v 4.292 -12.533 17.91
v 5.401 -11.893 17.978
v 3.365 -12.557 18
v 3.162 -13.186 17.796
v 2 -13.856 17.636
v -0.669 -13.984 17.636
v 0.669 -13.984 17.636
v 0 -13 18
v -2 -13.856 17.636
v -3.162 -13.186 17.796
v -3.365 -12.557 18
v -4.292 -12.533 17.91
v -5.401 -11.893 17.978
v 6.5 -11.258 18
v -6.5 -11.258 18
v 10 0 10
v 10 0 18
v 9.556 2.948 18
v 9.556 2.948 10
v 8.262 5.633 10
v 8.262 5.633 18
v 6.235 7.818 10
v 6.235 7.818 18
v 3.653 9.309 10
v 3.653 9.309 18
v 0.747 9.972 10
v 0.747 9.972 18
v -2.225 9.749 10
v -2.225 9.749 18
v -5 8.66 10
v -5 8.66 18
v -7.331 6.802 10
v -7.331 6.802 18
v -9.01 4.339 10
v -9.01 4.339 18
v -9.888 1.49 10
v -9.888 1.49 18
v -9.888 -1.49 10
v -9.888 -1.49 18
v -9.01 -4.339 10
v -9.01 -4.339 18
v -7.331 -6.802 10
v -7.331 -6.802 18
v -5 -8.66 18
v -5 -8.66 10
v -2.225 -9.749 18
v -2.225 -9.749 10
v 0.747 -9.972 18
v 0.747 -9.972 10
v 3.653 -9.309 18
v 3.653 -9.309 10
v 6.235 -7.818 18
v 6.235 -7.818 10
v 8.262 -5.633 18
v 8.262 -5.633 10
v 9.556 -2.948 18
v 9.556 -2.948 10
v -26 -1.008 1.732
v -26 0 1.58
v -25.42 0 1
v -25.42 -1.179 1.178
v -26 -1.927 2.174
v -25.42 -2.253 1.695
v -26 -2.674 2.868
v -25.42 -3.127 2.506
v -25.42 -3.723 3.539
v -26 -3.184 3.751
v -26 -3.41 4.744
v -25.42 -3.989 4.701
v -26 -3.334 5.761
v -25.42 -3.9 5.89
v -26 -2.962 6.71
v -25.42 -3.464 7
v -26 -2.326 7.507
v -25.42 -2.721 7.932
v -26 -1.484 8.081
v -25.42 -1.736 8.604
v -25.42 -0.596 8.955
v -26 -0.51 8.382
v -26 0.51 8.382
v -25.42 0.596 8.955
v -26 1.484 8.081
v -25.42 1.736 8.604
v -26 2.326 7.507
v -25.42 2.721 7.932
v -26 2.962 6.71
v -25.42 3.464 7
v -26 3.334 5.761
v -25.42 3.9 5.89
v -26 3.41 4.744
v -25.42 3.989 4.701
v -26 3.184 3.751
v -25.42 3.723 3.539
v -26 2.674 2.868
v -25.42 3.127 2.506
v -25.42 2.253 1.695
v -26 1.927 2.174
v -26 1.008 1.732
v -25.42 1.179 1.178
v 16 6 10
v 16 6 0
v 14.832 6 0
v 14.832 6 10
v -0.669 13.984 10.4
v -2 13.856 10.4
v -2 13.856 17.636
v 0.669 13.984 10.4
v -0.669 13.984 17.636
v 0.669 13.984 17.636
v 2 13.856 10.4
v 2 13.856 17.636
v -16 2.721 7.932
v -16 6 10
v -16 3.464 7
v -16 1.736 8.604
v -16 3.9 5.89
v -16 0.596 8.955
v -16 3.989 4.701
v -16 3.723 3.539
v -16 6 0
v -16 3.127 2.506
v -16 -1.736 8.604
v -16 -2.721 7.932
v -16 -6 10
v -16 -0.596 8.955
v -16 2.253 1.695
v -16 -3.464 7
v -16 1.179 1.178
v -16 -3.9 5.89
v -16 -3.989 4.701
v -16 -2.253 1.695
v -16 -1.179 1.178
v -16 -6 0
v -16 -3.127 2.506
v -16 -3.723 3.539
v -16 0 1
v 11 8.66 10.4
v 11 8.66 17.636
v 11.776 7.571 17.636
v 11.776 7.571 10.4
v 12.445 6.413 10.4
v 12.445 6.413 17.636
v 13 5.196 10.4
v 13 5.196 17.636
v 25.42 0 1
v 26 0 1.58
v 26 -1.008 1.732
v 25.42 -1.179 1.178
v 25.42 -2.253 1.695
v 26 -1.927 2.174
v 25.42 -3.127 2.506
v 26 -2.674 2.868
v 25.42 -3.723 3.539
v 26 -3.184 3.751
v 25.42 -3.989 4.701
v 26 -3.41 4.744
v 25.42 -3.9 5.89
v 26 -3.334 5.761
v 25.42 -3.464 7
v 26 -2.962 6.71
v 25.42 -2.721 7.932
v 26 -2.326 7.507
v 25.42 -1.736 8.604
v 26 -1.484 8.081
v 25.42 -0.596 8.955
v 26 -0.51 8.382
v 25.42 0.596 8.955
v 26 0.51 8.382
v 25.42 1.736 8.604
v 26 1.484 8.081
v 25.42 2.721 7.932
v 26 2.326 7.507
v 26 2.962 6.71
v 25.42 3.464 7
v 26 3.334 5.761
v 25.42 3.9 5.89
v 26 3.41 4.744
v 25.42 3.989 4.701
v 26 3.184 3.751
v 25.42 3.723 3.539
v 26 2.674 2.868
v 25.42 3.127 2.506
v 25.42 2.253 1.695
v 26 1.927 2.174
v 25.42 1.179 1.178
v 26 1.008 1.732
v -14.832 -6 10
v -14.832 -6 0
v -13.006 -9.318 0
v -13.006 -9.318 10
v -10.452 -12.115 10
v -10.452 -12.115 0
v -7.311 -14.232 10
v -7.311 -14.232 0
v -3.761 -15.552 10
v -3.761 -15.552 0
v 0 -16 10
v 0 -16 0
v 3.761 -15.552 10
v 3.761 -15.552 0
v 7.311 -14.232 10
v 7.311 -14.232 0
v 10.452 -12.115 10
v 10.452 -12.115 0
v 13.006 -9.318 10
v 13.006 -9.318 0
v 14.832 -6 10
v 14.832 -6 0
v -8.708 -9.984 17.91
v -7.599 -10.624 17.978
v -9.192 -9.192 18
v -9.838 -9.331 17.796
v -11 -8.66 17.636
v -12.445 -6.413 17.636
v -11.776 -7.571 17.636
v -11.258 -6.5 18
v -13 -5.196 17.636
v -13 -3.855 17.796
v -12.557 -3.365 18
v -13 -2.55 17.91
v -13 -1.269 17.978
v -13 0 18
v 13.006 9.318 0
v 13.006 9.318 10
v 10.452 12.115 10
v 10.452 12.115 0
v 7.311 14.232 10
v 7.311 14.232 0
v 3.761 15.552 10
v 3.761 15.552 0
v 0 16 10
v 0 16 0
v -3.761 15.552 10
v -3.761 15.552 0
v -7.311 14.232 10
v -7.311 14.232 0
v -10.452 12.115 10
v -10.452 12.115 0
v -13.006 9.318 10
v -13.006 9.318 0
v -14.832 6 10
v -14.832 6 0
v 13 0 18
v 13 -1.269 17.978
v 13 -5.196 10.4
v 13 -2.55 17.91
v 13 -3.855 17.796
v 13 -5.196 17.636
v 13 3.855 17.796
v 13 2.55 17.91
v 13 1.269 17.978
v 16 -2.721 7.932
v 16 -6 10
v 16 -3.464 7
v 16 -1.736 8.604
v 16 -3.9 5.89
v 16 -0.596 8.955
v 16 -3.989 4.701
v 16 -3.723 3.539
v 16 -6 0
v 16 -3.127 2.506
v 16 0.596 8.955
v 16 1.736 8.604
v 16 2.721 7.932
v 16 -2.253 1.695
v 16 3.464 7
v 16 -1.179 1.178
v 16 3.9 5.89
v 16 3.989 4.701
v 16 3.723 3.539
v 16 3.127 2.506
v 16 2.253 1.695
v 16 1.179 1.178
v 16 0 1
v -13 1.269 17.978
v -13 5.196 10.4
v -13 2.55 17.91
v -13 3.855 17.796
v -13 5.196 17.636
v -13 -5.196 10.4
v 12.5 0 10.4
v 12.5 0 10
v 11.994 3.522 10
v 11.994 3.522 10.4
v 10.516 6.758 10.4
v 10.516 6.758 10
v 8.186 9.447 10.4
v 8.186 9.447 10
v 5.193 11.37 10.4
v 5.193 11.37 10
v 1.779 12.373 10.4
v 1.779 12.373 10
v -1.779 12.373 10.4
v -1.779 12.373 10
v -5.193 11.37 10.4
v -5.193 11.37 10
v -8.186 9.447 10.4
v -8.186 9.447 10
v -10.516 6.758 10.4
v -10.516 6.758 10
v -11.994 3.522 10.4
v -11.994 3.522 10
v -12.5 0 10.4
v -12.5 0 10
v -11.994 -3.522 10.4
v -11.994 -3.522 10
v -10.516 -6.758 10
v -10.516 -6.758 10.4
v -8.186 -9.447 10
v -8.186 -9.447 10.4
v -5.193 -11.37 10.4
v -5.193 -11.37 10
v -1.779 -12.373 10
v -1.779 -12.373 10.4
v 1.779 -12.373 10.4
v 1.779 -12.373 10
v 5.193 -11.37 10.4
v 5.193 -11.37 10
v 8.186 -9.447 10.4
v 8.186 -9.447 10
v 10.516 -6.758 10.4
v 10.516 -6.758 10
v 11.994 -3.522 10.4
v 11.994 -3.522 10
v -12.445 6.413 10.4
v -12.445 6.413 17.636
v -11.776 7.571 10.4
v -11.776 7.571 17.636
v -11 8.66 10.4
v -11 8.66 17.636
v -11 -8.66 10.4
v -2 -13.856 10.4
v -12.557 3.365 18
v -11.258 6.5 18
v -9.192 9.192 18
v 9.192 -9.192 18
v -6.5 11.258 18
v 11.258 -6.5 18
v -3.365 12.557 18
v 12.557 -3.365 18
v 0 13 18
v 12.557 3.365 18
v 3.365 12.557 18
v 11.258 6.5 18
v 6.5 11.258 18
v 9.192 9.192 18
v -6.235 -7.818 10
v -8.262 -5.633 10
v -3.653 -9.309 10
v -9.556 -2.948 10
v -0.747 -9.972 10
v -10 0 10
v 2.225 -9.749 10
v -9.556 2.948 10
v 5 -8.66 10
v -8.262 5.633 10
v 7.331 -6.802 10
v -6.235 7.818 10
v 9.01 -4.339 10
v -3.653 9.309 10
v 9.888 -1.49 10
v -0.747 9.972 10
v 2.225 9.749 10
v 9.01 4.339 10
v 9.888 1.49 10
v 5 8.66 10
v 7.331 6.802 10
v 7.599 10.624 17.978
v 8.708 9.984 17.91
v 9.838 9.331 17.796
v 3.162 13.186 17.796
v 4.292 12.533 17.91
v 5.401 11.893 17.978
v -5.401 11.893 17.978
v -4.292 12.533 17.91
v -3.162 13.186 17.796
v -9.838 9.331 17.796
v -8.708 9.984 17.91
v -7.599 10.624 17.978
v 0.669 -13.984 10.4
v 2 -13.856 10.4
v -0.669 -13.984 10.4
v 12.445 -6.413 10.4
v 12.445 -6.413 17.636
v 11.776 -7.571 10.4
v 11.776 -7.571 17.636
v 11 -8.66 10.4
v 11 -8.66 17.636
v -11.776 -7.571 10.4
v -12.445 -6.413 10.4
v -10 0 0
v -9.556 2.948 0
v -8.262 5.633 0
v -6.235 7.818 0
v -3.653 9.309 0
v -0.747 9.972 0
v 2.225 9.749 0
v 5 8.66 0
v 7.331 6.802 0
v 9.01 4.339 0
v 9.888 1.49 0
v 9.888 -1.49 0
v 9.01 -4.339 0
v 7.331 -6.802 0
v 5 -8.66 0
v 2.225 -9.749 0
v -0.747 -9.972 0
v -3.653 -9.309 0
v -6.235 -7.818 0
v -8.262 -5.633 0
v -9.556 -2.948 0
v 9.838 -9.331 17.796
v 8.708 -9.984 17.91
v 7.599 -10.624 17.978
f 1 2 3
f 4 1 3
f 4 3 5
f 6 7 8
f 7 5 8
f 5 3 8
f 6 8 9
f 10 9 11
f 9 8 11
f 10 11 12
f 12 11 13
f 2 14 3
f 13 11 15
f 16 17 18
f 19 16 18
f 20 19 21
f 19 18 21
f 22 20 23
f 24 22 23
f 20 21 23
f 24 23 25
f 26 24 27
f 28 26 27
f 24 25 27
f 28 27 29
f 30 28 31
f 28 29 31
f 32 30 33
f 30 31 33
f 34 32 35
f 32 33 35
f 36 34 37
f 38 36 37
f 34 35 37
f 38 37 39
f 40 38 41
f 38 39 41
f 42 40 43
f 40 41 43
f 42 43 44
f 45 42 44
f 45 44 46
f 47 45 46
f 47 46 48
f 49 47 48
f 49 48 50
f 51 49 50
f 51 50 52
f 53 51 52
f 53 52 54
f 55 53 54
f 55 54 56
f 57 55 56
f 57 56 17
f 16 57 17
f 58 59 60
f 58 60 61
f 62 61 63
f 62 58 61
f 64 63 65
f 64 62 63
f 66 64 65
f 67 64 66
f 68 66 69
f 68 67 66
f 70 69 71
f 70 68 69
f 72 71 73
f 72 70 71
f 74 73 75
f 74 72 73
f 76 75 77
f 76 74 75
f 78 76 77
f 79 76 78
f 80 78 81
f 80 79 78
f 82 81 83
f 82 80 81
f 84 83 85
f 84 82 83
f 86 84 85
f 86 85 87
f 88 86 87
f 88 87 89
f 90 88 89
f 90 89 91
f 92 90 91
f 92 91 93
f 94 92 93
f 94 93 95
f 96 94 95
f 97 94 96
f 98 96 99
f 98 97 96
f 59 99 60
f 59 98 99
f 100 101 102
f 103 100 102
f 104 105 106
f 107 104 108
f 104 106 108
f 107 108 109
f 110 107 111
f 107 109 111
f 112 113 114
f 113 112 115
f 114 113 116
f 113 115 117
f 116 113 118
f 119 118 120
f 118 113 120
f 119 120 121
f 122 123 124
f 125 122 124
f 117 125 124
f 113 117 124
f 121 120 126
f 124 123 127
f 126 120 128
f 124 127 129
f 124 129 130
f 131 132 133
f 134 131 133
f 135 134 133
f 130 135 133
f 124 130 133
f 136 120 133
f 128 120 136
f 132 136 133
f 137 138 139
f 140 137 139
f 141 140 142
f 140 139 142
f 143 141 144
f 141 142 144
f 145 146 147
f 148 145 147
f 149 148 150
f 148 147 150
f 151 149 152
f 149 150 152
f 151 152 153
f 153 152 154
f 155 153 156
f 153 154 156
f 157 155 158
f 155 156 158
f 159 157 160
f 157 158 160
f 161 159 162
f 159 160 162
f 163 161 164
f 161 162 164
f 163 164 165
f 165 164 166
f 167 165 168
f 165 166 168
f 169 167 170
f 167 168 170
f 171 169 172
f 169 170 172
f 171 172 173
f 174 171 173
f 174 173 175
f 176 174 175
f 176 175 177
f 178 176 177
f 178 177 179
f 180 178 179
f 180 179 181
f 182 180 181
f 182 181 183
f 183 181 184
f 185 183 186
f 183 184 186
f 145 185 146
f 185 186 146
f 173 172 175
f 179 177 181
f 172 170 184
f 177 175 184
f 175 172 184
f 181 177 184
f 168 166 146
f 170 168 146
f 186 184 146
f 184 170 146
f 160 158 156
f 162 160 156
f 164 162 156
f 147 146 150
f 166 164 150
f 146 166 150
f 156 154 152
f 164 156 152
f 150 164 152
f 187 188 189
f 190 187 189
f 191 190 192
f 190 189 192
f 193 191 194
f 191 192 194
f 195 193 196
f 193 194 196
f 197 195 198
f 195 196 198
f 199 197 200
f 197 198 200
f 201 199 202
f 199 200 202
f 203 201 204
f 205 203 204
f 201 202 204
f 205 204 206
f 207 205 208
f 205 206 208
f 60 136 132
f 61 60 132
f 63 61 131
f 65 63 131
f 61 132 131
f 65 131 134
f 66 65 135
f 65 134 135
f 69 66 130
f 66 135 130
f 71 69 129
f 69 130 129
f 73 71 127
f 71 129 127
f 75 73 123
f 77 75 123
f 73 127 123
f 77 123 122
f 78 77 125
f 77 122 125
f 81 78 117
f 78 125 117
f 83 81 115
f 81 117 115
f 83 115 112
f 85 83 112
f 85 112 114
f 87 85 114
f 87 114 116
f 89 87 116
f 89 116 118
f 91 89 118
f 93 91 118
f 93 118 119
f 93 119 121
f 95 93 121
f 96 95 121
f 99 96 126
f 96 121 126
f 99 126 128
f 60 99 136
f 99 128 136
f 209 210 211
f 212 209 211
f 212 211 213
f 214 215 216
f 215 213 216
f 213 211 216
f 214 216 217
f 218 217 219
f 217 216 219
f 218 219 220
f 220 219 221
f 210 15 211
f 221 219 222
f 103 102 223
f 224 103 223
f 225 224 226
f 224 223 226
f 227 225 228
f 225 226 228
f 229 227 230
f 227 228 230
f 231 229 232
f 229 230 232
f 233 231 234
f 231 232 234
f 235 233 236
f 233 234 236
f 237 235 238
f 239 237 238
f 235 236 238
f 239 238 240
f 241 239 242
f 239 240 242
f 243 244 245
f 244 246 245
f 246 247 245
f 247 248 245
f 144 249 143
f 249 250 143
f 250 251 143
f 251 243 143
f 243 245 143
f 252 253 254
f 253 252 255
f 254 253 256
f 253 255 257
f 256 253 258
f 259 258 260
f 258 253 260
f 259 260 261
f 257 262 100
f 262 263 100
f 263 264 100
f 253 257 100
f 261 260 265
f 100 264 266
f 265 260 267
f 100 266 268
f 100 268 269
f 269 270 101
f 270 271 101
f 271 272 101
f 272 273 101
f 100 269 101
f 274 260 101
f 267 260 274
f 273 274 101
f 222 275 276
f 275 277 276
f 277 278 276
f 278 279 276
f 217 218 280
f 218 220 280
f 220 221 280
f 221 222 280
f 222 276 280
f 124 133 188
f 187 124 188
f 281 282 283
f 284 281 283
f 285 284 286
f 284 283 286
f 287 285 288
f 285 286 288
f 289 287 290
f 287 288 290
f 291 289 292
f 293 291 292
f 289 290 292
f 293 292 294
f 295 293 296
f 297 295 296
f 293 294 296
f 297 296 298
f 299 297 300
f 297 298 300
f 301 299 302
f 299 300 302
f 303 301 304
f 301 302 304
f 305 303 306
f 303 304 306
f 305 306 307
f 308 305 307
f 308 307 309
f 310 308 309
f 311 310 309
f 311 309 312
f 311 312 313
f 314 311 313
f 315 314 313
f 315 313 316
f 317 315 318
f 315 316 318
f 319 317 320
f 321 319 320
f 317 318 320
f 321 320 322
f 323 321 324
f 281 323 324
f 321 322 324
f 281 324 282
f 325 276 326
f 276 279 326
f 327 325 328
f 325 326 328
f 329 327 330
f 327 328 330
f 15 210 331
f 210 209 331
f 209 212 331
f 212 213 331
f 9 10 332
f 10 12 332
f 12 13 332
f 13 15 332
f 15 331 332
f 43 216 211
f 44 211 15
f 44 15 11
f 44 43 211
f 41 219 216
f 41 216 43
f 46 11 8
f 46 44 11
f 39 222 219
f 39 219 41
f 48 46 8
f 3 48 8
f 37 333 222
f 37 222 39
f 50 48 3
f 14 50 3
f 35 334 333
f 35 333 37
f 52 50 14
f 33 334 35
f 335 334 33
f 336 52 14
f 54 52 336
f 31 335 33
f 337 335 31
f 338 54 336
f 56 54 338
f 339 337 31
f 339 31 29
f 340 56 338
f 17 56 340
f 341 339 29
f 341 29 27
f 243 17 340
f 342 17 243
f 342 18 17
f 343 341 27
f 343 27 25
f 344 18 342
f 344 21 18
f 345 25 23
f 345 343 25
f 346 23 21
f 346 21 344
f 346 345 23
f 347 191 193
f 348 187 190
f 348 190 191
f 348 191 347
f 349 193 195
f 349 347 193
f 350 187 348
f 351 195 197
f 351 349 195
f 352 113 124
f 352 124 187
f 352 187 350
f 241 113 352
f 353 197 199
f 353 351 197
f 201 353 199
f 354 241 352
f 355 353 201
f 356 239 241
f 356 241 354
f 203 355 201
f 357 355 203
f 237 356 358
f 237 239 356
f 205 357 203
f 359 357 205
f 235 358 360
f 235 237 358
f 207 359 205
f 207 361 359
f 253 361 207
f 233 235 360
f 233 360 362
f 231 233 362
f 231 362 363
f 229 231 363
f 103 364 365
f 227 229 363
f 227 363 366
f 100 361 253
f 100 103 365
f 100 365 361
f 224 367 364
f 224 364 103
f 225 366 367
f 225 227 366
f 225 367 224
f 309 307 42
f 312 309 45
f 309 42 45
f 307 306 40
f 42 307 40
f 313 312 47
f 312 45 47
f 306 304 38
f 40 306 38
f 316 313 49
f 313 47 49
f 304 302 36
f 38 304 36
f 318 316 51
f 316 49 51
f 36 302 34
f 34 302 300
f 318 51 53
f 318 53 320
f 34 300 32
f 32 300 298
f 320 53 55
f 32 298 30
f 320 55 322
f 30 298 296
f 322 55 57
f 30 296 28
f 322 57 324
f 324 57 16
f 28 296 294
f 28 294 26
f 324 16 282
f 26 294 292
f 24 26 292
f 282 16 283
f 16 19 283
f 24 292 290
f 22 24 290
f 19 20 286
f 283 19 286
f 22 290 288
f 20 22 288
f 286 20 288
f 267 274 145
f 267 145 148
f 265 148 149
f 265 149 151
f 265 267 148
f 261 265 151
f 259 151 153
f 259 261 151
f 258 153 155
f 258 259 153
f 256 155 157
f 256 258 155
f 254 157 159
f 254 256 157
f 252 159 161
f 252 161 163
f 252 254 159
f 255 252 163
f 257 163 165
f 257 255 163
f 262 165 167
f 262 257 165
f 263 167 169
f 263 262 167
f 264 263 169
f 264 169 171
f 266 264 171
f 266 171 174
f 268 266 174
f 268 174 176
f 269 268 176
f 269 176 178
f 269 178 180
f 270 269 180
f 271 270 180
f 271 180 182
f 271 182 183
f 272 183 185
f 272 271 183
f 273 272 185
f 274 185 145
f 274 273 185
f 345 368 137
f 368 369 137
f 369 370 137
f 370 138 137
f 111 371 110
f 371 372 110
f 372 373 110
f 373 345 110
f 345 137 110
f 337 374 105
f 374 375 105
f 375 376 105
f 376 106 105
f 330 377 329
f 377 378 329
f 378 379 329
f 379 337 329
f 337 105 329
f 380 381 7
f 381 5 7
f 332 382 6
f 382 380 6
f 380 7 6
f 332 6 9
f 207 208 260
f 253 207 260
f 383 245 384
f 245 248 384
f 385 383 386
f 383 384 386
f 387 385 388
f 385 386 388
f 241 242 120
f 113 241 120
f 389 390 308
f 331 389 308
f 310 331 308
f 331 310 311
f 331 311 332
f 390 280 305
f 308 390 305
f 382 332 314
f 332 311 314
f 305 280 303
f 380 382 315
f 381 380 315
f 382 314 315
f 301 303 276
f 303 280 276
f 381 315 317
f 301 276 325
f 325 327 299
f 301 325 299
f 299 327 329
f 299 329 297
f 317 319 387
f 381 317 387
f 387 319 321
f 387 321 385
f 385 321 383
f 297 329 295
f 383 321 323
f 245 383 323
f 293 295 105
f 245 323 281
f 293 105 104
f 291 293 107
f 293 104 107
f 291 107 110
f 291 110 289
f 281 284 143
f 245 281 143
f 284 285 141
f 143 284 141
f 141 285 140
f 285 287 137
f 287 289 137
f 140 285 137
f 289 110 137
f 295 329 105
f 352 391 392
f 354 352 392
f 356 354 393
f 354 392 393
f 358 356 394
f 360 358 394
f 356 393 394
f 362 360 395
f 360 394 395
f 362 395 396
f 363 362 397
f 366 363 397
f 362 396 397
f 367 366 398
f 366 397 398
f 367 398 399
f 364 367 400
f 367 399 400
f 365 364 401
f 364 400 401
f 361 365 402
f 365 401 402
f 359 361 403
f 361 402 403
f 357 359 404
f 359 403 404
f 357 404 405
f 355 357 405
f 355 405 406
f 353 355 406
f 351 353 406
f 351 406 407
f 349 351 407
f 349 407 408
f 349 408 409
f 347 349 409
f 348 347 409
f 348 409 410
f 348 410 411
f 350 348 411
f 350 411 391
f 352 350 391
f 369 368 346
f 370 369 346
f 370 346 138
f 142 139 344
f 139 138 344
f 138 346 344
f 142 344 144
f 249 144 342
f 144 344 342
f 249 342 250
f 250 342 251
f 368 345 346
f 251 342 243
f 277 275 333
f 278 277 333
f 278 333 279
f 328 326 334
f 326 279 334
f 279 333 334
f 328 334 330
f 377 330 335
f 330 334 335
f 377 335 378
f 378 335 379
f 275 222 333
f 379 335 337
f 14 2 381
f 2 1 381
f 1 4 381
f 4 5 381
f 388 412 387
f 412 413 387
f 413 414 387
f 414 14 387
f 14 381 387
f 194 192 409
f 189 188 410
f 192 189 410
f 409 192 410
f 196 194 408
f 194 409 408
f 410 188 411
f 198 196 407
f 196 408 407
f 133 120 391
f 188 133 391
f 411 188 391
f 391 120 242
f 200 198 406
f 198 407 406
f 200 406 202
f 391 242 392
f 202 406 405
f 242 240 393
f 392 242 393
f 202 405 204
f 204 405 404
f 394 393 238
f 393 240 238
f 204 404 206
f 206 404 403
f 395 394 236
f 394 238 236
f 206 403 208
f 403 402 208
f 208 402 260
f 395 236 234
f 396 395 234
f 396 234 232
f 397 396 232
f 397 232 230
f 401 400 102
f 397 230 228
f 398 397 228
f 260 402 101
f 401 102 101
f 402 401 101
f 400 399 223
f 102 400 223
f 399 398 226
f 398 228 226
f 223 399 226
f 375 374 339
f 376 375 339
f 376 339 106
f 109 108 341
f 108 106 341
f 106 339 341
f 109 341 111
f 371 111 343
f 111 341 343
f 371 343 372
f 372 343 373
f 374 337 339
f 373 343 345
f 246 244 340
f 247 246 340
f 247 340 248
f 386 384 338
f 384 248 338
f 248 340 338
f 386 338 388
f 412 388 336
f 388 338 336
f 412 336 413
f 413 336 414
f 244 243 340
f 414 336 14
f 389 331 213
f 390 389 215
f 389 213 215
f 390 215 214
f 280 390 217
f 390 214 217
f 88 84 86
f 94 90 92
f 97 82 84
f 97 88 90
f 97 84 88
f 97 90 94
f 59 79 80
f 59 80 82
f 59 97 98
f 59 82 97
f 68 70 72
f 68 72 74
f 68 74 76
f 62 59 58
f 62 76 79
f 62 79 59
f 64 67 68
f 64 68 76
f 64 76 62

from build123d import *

# Parameters (mm, degrees)
EXTRUDE_1_DEPTH     = 10
SKETCH_3_R          = 4
EXTRUDE_2_DEPTH     = 10
EXTRUDE_3_DEPTH     = 8
SKETCH_6_R          = 15.011106999
SKETCH_6_R_2        = 12.5
CUT_EXTRUDE_1_DEPTH = 0.4
SKETCH_7_OUTSIDE_W  = 66.732
SKETCH_7_OUTSIDE_H  = 46.732
SKETCH_7_OUTSIDE_R  = 14
CUT_EXTRUDE_2_DEPTH = 8
SKETCH_8_R          = 10
CUT_EXTRUDE_3_DEPTH = 36.440090293
SKETCH_9_R          = 10
CUT_EXTRUDE_4_DEPTH = 36.440090293
CHAMFER_1_SIZE      = 0.58


with BuildPart() as part:
    # 草图2 → 凸台-拉伸1 (new body)
    with BuildSketch(Plane.XY):
        with BuildLine():
            Line((-16, 6), (-16, -6))
            Line((-16, -6), (-14.832396974, -6))
            ThreePointArc((-14.832396974, -6), (0, -16), (14.832396974, -6))
            Line((14.832396974, -6), (16, -6))
            Line((16, -6), (16, 6))
            Line((16, 6), (14.832396974, 6))
            ThreePointArc((14.832396974, 6), (0, 16), (-14.832396974, 6))
            Line((-14.832396974, 6), (-16, 6))
        make_face()
    extrude(amount=EXTRUDE_1_DEPTH)

    # 草图3 → 凸台-拉伸2 (add)
    with BuildSketch(Plane.ZY.offset(16)):
        with Locations(Location((5, 0, 0), (0, 0, 180))):
            Circle(SKETCH_3_R)
    extrude_2 = extrude(amount=EXTRUDE_2_DEPTH)

    # 镜向1: 凸台-拉伸2 across plane
    add(extrude_2.mirror(Plane(origin=(0, 0, 0), x_dir=(0, 0, 1), z_dir=(1, 0, 0))))

    # 草图8 → 切除-拉伸3 (cut, through all)
    with BuildSketch(Plane(origin=(0, 0, 0), x_dir=(-1, 0, 0), z_dir=(0, 0, -1))):
        Circle(SKETCH_8_R)
    extrude(amount=-CUT_EXTRUDE_3_DEPTH, mode=Mode.SUBTRACT)

    # 倒角1
    chamfer_1_edges = [part.edges().sort_by_distance(p)[0] for p in [
        (-26, 0, 9),
        (26, 0, 9),
    ]]
    chamfer(chamfer_1_edges, length=CHAMFER_1_SIZE)


with BuildPart() as body_2:
    # 草图4 → 凸台-拉伸3 (new body)
    with BuildSketch(Plane.XY.offset(10)):
        Polygon((13, 7.505553499), (0, 15.011106999), (-13, 7.505553499), (-13, -7.505553499), (0, -15.011106999), (13, -7.505553499), align=None)
    extrude(amount=EXTRUDE_3_DEPTH)

    # 草图5 → 切除-旋转1 (revolve, cut)
    with BuildSketch(Plane(origin=(0, 0, 0), x_dir=(1, 0, 0), z_dir=(0, 1, 0))):
        Polygon((-13, -18), (-23.989909678, -18), (-23.989909678, -14), align=None)
    revolve(axis=Axis((0, 0, 10), (0, 0, -1)), mode=Mode.SUBTRACT)

    # 草图6 → 切除-拉伸1 (cut)
    with BuildSketch(Plane.XY.offset(10)):
        Circle(SKETCH_6_R)
        Circle(SKETCH_6_R_2, mode=Mode.SUBTRACT)
    extrude(amount=CUT_EXTRUDE_1_DEPTH, mode=Mode.SUBTRACT)

    # 草图7 outside → 切除-拉伸2 (cut)
    with BuildSketch(Plane(origin=(0, 0, 18), x_dir=(-1, 0, 0), z_dir=(0, 0, -1))):
        Rectangle(SKETCH_7_OUTSIDE_W, SKETCH_7_OUTSIDE_H)
        Circle(SKETCH_7_OUTSIDE_R, mode=Mode.SUBTRACT)
    extrude(amount=CUT_EXTRUDE_2_DEPTH, mode=Mode.SUBTRACT)

    # 草图9 → 切除-拉伸4 (cut, through all)
    with BuildSketch(Plane.XY.offset(18)):
        Circle(SKETCH_9_R)
    extrude(amount=-CUT_EXTRUDE_4_DEPTH, mode=Mode.SUBTRACT)


solid = Compound([part.part, body_2.part])
